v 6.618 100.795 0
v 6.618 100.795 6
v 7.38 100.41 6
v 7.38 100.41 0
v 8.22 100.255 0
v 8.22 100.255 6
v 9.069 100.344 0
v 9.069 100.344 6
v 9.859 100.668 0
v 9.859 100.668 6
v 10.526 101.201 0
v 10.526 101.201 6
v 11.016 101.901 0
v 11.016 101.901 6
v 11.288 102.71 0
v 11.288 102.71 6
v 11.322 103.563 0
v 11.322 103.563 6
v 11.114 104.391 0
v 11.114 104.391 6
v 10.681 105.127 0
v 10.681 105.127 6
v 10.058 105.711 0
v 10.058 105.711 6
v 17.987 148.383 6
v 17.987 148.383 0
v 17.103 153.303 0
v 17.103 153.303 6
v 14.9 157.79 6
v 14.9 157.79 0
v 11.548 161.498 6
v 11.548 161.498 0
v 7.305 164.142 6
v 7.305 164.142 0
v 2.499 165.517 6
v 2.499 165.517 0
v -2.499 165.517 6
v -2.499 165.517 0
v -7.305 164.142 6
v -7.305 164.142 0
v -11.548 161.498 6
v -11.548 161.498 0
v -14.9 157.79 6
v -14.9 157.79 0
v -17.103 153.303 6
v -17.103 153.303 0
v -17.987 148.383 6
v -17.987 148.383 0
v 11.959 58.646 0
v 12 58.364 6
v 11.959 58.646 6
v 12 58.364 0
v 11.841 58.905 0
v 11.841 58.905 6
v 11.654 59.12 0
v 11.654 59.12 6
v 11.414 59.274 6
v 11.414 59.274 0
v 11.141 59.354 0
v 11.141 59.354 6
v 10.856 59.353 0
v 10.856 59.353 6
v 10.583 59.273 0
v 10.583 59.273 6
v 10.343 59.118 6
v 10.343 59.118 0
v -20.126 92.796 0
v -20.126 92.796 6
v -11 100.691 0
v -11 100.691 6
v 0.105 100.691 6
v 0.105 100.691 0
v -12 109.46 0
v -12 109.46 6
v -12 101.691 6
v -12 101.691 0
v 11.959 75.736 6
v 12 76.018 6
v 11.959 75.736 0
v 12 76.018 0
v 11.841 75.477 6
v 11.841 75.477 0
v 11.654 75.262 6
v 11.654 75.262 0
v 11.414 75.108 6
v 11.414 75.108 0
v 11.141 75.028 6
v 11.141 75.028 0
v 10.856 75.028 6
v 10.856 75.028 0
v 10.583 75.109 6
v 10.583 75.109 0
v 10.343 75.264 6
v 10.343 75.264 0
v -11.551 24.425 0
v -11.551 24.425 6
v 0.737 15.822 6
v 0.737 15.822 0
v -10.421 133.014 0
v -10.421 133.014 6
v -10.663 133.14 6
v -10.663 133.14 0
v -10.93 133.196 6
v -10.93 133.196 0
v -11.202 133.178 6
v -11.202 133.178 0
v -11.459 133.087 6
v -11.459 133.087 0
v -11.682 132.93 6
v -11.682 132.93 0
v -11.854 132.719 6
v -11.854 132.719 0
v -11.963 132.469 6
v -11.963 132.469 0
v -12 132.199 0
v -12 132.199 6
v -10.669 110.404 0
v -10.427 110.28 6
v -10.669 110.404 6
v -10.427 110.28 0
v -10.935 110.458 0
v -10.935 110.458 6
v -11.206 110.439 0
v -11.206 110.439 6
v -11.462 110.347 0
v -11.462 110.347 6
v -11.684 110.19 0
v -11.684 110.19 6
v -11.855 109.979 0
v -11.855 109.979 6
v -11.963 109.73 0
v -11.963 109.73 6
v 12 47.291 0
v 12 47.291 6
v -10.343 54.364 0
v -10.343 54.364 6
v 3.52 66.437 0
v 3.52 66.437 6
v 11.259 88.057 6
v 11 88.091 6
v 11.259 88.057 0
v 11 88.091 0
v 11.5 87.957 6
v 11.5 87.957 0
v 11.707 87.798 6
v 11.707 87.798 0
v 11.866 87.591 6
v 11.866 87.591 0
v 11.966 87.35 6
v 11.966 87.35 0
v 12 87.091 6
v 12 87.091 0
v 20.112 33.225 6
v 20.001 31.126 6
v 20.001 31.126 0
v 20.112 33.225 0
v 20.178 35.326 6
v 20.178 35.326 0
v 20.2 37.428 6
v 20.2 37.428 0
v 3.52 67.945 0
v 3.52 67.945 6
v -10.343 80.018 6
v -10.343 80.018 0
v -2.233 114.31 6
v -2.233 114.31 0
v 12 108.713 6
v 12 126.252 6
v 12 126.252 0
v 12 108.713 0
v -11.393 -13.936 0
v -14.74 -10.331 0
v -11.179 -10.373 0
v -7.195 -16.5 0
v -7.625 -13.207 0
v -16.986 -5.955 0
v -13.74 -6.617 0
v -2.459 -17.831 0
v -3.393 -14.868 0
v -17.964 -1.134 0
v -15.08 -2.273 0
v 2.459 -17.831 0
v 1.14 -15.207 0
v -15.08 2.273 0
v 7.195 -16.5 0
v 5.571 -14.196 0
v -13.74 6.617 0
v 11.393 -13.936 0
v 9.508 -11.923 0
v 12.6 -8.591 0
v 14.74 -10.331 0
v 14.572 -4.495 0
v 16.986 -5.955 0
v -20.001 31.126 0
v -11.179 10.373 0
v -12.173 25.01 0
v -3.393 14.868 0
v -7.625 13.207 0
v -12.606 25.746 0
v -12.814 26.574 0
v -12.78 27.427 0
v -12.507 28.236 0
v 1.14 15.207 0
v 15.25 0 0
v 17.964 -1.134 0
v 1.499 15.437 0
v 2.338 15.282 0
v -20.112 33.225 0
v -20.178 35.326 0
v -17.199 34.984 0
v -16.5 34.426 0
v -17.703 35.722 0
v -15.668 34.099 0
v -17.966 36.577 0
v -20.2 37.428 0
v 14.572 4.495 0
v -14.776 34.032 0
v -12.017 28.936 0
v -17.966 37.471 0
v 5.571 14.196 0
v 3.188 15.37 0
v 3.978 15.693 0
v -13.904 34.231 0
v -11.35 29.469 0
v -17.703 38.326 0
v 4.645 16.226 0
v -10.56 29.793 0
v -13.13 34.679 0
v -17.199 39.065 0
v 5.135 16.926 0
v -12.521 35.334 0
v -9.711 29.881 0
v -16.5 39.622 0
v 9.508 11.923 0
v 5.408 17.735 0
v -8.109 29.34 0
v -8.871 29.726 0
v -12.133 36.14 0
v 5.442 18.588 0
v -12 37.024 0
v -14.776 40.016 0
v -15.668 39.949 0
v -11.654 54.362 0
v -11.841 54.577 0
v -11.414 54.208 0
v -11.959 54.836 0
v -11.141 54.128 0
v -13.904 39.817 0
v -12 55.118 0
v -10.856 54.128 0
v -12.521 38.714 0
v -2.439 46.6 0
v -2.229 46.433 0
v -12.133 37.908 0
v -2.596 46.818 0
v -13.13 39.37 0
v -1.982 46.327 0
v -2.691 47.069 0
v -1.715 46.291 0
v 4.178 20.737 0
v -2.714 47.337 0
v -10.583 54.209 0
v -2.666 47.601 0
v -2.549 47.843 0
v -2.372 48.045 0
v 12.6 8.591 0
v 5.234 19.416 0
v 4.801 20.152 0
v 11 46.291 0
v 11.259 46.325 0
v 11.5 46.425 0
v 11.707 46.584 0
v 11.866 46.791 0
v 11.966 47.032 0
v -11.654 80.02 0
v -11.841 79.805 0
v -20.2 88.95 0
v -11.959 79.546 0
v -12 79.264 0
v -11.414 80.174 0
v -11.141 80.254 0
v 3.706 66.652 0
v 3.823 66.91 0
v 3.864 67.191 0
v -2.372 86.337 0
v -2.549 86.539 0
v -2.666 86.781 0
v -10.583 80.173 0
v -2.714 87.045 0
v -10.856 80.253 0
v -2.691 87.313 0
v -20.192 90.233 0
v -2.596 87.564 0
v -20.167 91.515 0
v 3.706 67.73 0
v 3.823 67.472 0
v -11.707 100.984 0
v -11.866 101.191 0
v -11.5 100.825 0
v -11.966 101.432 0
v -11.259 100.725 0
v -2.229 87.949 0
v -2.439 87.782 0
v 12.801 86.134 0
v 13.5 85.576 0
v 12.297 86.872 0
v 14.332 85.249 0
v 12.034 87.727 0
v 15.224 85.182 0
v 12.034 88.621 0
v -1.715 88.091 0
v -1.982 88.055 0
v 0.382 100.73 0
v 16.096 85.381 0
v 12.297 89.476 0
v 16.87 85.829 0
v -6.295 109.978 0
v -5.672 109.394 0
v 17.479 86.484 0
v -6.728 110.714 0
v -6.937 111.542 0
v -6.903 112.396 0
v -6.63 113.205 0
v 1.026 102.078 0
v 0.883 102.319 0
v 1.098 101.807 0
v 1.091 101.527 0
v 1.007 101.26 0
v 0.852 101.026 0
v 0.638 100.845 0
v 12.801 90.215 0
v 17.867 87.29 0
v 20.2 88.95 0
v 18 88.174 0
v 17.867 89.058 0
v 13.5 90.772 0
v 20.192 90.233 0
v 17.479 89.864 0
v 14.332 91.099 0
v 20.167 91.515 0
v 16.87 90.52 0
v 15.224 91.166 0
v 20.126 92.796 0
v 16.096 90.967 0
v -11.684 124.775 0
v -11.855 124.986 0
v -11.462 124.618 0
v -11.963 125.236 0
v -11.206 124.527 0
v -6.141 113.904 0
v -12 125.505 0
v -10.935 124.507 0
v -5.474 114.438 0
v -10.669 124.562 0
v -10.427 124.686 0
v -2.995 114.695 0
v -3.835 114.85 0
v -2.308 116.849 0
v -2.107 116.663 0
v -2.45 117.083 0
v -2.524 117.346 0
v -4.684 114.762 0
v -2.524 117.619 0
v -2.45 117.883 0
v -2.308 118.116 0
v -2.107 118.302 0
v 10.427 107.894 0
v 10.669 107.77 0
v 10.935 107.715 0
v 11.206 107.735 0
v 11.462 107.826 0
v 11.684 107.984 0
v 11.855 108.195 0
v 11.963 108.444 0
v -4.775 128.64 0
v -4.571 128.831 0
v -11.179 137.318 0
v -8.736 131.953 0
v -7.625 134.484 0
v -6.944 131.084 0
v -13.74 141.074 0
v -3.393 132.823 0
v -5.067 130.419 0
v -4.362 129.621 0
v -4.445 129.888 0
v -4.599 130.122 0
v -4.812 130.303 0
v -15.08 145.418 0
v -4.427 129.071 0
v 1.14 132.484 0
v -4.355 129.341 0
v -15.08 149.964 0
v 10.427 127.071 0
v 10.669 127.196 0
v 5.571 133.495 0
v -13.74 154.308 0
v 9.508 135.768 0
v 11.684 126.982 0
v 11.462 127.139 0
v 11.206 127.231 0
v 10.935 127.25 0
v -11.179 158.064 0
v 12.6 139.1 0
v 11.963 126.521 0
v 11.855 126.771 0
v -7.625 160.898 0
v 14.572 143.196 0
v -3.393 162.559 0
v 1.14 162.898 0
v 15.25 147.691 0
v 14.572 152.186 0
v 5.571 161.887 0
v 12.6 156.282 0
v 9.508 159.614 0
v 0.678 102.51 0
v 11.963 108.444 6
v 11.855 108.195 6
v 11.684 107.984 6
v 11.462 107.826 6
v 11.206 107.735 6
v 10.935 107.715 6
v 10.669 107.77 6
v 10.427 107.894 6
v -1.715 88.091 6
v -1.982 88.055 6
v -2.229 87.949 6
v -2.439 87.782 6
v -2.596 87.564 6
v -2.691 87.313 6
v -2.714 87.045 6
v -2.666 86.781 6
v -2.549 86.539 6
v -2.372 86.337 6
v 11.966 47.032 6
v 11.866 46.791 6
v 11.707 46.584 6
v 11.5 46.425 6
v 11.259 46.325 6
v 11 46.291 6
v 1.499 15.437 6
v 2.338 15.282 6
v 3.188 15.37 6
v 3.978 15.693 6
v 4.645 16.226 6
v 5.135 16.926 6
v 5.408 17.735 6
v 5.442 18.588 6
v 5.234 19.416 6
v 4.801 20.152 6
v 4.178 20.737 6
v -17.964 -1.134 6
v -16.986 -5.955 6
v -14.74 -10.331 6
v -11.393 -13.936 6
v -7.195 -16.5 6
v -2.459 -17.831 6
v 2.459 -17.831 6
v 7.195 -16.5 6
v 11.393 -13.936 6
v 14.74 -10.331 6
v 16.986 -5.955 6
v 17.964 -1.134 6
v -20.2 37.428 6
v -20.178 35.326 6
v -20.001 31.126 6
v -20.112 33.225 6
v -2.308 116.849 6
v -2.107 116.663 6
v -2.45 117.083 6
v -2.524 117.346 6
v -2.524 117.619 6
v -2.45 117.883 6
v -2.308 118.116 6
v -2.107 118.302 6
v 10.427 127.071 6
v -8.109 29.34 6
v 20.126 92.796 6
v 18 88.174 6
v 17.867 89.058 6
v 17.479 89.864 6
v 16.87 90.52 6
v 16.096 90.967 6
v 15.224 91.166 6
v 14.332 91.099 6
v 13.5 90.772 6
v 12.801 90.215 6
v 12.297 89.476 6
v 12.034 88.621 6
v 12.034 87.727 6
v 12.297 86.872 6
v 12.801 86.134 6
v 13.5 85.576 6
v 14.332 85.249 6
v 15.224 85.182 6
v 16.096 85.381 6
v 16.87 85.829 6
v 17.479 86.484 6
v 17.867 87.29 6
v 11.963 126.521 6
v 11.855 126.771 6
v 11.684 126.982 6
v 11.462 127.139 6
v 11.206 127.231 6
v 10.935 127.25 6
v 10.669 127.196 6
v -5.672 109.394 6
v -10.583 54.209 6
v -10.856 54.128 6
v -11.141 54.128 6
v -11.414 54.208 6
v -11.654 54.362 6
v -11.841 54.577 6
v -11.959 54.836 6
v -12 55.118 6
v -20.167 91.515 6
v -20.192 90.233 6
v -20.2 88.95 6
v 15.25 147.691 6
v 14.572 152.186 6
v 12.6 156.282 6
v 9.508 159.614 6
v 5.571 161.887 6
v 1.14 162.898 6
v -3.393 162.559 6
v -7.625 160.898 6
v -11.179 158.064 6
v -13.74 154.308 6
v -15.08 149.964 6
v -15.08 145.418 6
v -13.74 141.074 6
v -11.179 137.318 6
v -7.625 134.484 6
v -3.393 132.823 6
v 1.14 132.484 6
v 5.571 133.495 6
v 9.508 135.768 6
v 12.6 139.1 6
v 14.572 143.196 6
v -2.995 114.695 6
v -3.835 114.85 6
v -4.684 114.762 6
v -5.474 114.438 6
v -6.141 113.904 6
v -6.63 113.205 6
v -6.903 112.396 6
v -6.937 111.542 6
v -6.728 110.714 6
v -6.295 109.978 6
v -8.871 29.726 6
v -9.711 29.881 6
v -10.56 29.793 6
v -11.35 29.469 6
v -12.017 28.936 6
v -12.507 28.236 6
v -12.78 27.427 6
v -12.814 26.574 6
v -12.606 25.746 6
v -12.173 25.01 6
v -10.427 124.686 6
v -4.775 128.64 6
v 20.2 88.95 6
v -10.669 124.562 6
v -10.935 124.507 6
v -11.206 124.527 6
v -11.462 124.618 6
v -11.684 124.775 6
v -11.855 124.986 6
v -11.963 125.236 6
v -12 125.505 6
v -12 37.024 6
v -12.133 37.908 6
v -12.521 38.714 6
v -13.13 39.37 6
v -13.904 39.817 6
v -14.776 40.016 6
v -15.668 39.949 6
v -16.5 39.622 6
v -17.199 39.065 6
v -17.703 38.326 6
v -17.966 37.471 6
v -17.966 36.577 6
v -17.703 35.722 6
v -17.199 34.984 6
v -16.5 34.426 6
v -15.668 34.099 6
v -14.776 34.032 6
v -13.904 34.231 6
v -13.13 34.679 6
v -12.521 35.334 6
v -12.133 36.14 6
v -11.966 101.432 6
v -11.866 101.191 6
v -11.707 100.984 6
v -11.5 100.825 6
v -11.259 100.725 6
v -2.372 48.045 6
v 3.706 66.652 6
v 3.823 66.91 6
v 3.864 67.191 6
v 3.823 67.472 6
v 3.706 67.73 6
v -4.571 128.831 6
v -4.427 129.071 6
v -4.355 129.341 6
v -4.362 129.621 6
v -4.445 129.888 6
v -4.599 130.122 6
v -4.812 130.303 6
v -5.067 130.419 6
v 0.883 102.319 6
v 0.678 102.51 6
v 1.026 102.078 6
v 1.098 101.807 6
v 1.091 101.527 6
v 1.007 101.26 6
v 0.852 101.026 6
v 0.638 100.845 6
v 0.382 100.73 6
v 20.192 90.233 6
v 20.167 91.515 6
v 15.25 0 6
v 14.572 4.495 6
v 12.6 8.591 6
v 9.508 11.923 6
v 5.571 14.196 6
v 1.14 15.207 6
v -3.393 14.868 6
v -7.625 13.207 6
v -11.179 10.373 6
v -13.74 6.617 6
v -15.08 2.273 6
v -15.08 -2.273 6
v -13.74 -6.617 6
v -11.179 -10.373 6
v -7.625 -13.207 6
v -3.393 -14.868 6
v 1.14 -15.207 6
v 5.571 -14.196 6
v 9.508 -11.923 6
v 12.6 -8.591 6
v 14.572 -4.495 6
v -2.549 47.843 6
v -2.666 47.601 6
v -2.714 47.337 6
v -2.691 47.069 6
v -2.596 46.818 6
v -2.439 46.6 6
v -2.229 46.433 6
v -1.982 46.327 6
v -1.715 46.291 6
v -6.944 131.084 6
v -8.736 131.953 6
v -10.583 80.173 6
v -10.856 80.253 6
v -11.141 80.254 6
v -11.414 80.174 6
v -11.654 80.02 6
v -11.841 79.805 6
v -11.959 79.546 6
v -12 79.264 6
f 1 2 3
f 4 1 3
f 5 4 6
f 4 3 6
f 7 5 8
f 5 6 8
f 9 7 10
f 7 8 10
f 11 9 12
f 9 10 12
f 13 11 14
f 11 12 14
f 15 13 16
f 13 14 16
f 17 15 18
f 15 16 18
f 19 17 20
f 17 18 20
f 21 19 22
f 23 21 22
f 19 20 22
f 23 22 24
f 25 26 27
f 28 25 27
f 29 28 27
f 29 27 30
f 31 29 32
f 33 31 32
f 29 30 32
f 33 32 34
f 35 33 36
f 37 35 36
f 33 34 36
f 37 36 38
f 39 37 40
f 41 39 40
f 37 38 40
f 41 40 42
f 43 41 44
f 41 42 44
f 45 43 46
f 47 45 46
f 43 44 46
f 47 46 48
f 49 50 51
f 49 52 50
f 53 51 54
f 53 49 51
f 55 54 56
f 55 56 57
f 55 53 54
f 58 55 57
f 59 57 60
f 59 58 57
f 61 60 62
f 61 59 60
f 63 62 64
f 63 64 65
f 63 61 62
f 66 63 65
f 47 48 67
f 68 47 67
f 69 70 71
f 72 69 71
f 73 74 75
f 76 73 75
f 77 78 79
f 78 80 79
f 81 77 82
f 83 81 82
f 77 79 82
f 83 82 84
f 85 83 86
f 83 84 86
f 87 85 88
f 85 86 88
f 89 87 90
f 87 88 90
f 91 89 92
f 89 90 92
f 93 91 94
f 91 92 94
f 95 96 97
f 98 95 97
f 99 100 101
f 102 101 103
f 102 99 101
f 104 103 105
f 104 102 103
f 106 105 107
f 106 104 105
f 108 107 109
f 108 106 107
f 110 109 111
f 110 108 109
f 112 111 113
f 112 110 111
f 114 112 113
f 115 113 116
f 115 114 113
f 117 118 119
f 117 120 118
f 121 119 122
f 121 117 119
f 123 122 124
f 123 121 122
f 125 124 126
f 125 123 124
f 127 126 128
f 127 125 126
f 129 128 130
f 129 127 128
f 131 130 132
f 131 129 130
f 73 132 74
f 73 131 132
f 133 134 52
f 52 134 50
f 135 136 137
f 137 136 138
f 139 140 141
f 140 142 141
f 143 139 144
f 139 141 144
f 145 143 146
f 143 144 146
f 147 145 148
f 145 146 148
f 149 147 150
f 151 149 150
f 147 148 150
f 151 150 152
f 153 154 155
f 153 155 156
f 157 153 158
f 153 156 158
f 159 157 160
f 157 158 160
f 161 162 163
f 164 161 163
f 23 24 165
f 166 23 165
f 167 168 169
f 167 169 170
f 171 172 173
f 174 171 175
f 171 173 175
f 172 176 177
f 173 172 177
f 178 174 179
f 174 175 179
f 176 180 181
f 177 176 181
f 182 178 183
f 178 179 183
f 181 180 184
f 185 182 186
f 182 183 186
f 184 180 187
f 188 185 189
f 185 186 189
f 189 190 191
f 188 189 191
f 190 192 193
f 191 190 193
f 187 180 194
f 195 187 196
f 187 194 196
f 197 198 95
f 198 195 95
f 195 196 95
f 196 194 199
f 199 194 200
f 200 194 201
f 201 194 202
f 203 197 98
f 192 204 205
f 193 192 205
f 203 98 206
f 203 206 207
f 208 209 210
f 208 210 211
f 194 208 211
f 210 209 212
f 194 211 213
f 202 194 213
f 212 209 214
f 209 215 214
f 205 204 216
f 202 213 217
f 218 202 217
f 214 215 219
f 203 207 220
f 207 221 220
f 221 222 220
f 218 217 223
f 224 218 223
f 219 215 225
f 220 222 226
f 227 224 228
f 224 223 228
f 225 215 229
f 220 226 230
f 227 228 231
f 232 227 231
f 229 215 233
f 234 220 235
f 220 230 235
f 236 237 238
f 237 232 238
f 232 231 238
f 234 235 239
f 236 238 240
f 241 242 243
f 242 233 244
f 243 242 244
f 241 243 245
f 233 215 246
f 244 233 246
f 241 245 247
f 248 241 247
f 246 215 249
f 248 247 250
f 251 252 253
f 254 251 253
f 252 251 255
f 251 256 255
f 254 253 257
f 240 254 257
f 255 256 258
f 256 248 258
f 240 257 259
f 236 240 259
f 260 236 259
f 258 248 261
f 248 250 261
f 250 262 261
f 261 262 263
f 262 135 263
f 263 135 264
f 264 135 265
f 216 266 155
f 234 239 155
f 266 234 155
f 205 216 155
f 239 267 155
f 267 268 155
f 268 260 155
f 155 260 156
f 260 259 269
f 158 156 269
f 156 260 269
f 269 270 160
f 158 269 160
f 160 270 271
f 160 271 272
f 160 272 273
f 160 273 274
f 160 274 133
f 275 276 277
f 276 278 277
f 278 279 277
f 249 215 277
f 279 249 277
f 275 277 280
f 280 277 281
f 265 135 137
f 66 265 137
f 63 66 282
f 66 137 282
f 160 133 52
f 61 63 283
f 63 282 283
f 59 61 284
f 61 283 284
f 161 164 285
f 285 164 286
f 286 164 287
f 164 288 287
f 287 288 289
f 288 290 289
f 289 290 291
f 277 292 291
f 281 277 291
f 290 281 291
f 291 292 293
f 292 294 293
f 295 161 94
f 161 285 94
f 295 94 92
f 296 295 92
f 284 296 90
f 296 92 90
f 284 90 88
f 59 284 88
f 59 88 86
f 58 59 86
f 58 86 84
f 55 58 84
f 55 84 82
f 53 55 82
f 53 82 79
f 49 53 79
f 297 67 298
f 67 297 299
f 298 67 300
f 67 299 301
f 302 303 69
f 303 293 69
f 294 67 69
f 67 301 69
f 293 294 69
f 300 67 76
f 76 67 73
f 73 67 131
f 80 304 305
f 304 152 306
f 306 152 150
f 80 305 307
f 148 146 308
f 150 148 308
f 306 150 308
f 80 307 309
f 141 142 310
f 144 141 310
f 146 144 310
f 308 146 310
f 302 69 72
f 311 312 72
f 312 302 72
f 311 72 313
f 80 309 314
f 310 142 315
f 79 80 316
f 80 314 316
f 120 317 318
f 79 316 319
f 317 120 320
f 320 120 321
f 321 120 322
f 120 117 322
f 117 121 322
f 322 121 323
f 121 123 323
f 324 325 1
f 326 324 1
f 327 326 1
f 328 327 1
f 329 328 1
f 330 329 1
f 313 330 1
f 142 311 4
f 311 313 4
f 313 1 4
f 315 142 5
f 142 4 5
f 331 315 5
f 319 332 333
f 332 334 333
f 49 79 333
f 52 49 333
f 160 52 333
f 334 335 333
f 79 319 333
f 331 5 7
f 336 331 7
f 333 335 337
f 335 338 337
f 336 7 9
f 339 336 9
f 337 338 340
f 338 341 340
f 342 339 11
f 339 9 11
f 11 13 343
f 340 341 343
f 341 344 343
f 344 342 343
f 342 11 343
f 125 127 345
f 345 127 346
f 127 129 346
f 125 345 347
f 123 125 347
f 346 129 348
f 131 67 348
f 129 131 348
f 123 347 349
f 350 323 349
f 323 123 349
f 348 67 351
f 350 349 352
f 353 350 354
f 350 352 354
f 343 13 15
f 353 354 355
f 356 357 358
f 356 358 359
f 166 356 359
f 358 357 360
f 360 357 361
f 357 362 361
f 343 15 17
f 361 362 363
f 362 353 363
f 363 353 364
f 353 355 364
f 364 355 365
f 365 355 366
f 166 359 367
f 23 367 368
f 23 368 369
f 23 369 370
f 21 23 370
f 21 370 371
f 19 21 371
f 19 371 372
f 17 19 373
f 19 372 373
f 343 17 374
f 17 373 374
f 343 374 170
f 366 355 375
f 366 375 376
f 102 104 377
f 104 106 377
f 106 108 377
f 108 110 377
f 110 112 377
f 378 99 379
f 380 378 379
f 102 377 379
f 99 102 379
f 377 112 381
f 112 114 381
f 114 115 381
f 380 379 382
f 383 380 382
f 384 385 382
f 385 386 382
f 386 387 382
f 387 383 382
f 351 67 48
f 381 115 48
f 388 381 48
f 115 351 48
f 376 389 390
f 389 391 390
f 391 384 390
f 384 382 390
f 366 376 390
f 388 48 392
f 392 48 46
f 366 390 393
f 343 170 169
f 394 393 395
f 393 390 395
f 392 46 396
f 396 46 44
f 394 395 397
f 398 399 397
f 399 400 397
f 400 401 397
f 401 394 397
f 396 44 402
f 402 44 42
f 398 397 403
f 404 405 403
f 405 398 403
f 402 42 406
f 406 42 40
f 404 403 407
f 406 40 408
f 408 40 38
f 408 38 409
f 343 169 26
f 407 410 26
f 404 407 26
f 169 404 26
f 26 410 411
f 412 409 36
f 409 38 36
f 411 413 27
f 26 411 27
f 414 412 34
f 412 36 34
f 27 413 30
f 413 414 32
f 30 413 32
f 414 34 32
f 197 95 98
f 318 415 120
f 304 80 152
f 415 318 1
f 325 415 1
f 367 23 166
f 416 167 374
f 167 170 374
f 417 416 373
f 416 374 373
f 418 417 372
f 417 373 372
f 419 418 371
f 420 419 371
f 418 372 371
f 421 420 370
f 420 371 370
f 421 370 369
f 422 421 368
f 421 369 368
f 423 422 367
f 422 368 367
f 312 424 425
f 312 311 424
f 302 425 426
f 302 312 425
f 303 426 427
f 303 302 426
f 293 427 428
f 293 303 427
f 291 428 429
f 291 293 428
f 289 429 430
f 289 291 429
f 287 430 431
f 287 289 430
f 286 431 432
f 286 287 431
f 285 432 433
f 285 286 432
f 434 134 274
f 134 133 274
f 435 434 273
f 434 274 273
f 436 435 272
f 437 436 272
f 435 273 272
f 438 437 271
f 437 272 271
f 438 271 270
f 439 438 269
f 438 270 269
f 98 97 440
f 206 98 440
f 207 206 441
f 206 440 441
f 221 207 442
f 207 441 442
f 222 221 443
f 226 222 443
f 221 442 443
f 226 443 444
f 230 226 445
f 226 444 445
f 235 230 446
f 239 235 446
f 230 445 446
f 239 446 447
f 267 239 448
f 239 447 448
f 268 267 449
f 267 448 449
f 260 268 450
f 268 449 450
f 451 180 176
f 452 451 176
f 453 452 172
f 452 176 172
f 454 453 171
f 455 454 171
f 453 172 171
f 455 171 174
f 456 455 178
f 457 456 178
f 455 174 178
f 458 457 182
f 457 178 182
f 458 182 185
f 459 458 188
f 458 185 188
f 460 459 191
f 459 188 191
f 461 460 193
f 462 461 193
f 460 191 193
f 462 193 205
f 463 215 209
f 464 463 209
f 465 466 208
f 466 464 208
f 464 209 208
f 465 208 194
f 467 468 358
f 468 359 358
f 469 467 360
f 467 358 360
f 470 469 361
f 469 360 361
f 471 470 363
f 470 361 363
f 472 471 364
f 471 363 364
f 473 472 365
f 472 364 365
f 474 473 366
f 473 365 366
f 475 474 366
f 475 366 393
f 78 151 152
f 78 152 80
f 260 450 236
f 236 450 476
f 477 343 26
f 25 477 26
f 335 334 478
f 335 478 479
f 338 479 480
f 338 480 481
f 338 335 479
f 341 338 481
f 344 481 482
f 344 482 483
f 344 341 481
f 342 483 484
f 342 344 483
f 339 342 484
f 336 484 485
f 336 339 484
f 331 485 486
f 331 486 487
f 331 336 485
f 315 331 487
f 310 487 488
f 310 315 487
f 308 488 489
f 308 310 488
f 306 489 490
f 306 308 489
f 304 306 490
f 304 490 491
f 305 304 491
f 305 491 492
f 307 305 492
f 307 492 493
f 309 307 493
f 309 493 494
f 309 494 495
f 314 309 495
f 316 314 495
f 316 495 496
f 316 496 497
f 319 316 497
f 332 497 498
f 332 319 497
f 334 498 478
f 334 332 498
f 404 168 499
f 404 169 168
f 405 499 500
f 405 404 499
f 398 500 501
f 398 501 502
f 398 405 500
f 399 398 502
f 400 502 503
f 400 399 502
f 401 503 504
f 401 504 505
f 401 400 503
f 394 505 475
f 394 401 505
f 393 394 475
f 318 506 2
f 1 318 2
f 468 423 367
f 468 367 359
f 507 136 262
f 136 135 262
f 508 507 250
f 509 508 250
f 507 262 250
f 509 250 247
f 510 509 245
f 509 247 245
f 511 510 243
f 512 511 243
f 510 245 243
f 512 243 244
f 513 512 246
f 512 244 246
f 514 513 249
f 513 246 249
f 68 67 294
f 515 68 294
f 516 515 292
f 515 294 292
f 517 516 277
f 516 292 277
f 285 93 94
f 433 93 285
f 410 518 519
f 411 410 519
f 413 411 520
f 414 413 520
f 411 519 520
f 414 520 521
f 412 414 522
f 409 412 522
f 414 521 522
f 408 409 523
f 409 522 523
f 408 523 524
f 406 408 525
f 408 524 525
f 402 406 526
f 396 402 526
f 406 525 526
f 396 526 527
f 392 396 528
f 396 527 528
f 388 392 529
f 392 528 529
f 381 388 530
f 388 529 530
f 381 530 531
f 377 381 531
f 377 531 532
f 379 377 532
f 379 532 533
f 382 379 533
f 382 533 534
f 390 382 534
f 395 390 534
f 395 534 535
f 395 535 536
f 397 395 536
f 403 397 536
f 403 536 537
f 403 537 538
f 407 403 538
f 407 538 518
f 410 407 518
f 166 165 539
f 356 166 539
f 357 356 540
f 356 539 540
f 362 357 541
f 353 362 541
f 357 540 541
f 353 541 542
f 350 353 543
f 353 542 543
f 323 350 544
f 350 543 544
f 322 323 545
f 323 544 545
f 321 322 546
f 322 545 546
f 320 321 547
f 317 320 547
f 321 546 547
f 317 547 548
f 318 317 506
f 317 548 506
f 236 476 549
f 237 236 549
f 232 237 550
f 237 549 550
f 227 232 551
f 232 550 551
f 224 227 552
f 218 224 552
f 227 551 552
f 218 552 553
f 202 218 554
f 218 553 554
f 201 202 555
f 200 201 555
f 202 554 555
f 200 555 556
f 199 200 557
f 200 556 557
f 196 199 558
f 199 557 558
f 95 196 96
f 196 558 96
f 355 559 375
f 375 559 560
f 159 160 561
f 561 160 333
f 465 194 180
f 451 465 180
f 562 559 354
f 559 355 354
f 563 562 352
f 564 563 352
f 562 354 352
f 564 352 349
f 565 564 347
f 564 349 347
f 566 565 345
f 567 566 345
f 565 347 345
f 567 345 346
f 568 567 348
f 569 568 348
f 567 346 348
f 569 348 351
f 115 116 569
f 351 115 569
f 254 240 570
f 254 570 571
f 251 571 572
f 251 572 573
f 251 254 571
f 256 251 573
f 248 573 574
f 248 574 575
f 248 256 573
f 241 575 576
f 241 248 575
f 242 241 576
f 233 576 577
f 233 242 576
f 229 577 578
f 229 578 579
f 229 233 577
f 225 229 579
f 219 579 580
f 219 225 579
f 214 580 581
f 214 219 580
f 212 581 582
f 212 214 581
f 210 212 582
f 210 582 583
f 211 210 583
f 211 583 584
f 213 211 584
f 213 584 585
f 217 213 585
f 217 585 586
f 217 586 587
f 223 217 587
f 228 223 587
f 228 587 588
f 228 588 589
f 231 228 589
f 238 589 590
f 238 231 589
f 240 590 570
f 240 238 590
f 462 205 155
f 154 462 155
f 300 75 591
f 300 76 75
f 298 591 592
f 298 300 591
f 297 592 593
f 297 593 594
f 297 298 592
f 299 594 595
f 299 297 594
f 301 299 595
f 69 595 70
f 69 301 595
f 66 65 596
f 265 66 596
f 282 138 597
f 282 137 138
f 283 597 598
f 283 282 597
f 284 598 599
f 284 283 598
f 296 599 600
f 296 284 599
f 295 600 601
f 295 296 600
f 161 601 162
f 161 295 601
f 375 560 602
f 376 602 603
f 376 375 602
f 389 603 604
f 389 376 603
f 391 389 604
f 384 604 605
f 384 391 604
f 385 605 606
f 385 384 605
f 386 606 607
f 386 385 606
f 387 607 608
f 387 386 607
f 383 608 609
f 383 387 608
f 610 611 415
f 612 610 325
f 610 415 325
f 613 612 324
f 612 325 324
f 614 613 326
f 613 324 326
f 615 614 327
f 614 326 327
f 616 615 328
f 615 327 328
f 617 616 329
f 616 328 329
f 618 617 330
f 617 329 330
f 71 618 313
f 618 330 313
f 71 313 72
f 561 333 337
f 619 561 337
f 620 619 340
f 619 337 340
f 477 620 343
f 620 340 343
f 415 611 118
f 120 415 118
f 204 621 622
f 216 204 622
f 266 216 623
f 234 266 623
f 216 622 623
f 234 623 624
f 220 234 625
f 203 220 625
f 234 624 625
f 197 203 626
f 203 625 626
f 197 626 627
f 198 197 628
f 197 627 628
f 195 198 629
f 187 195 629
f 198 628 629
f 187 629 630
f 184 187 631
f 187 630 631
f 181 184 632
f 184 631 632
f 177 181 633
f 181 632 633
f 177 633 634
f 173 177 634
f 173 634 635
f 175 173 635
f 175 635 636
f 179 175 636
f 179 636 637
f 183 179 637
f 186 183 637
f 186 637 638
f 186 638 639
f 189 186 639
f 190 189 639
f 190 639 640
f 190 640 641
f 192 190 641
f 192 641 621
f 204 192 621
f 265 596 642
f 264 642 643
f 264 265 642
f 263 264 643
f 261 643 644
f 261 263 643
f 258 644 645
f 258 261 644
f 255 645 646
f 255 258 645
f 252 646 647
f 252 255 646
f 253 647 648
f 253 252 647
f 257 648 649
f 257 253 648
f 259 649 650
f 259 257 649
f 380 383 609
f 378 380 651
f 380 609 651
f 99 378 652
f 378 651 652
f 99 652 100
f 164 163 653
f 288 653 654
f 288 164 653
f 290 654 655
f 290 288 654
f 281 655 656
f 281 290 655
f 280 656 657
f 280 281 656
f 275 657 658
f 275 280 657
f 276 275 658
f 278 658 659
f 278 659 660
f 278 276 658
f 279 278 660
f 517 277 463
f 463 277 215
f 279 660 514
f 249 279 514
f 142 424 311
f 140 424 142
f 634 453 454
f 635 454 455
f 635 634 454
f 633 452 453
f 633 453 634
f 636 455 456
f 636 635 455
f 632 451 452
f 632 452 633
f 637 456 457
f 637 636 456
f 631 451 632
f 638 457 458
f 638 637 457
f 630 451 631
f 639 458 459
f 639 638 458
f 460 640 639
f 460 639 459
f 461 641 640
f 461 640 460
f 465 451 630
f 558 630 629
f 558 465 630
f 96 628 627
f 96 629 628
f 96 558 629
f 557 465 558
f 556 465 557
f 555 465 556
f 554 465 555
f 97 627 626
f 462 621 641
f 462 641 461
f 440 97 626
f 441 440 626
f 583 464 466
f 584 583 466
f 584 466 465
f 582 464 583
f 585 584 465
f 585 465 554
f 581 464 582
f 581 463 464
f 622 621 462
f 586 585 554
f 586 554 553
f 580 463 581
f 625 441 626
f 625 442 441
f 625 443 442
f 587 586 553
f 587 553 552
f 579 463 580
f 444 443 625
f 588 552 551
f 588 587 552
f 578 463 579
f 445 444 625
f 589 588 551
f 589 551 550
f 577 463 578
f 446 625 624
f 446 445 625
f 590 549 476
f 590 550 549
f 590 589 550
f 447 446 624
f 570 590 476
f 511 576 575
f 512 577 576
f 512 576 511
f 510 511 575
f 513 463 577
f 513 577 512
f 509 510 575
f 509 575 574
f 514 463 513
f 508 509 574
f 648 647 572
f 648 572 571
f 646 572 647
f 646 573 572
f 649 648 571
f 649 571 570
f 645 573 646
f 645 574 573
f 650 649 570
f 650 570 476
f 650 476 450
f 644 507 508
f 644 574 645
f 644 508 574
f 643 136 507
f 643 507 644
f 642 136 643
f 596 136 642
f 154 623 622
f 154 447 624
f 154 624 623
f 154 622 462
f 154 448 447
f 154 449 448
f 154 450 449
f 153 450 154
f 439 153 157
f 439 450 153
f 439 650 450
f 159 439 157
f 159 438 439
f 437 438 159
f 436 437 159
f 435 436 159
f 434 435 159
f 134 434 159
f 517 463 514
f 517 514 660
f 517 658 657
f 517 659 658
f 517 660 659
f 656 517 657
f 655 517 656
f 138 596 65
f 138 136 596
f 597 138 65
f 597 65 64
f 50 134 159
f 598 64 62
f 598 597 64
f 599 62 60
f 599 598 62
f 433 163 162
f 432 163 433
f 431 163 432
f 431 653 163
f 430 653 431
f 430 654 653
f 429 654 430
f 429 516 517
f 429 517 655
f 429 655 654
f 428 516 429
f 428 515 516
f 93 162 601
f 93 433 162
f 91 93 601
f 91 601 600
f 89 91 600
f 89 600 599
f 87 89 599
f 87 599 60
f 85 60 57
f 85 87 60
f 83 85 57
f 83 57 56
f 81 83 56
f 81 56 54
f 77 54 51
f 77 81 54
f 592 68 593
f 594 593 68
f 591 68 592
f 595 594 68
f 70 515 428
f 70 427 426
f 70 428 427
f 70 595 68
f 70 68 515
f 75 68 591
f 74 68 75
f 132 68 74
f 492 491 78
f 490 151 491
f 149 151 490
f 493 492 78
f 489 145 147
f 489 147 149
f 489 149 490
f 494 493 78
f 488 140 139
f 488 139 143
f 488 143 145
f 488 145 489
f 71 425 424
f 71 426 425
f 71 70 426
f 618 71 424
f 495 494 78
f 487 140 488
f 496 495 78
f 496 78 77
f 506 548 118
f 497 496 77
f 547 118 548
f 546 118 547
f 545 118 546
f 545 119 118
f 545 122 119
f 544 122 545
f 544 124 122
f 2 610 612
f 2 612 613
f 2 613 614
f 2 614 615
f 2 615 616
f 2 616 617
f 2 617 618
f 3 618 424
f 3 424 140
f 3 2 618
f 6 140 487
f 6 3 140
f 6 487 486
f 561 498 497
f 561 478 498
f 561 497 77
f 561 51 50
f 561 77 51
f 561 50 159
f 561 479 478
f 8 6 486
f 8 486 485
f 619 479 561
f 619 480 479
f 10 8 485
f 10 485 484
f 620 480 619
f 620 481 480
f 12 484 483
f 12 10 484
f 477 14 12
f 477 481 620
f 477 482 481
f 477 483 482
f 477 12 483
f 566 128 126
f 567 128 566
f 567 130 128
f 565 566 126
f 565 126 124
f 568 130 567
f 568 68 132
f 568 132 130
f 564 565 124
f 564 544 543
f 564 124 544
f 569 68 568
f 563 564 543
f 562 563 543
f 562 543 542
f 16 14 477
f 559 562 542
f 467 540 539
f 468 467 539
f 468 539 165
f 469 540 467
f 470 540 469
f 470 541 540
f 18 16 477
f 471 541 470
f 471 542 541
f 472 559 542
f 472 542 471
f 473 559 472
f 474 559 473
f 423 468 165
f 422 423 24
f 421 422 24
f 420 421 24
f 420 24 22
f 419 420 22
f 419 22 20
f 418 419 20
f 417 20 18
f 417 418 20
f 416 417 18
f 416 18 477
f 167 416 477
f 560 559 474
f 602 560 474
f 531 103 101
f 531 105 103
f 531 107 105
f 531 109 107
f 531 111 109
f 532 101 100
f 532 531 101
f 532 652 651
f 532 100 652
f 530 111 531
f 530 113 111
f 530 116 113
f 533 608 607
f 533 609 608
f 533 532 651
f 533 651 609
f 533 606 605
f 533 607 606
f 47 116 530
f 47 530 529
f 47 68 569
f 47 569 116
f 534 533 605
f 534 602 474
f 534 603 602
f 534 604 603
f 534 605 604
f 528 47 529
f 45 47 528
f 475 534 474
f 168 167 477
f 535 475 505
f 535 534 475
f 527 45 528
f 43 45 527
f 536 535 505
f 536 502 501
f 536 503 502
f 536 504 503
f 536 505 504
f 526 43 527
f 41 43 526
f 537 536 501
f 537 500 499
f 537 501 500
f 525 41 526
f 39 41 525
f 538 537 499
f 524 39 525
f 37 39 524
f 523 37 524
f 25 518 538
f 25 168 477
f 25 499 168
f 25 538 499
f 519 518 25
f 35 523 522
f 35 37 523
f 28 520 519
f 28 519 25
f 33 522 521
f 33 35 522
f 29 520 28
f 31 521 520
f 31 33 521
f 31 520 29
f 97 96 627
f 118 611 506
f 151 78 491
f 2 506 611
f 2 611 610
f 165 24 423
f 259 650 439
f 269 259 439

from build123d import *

# Parameters (mm, degrees)
SKETCH1_R               = 7.95
SKETCH1_R_2             = 3
MAIN_BODY_LINK_B1_DEPTH = 6
CUT_EXTRUDE2_REACH      = 169.025
CUT_EXTRUDE3_REACH      = 169.025
SKETCH5_R               = 1.5
PULLEYIDLERUP_DEPTH     = 6
CUT_EXTRUDE5_DEPTH      = 6
FILLET4_R               = 1
FILLET5_R               = 100
SKETCH8_R               = 15.25
CUT_EXTRUDE6_DEPTH      = 168.02546447


with BuildPart() as part:
    # Sketch1 → Main Body Link B1 (new body)
    with BuildSketch(Plane.XY):
        with BuildLine():
            Line((20.2, 41.674052381), (20.2, 83.474052381))
            Line((20.2, 83.474052381), (20.2, 90.874052381))
            Line((20.2, 90.874052381), (17.986683974, 148.383116621))
            ThreePointArc((17.986683974, 148.383116621), (0, 165.690874165), (-17.986683974, 148.383116621))
            Line((-17.986683974, 148.383116621), (-20.2, 90.874052381))
            Line((-20.2, 90.874052381), (-20.2, 83.474052381))
            Line((-20.2, 83.474052381), (-20.2, 41.674052381))
            Line((-20.2, 41.674052381), (-20.2, 34.274052381))
            Line((-20.2, 34.274052381), (-17.964224051, -1.134307826))
            ThreePointArc((-17.964224051, -1.134307826), (0, -18), (17.964224051, -1.134307826))
            Line((17.964224051, -1.134307826), (20.2, 34.274052381))
            Line((20.2, 34.274052381), (20.2, 41.674052381))
        make_face()
        Circle(SKETCH1_R, mode=Mode.SUBTRACT)
        with Locations((15, 88.174052381)):
            Circle(SKETCH1_R_2, mode=Mode.SUBTRACT)
        with Locations((-15, 37.024052381)):
            Circle(SKETCH1_R_2, mode=Mode.SUBTRACT)
        with Locations((0, 147.690874165)):
            Circle(SKETCH1_R, mode=Mode.SUBTRACT)
    extrude(amount=MAIN_BODY_LINK_B1_DEPTH)

    # Sketch4 → Cut-Extrude2 (cut, up to next)
    with BuildSketch(Plane.XY.offset(6), mode=Mode.PRIVATE) as cut_extrude2_sk1:
        with BuildLine():
            Line((-12, 134.2744663), (-12, 123.584968066))
            Line((-12, 123.584968066), (-2.929911079, 129.930929878))
            ThreePointArc((-2.929911079, 129.930929878), (-7.774454217, 131.456408925), (-12, 134.2744663))
        make_face()
    cut_extrude2_tool1 = extrude(cut_extrude2_sk1.sketch, amount=-CUT_EXTRUDE2_REACH, mode=Mode.PRIVATE) & part.part
    # Sketch4 → Cut-Extrude2 (cut, up to next)
    with BuildSketch(Plane.XY.offset(6), mode=Mode.PRIVATE) as cut_extrude2_sk2:
        Polygon((-12, 100.690874165), (3.278172542, 100.690874165), (-12, 111.380372399), align=None)
    cut_extrude2_tool2 = extrude(cut_extrude2_sk2.sketch, amount=-CUT_EXTRUDE2_REACH, mode=Mode.PRIVATE) & part.part
    # Sketch4 → Cut-Extrude2 (cut, up to next)
    with BuildSketch(Plane.XY.offset(6), mode=Mode.PRIVATE) as cut_extrude2_sk3:
        Polygon((12, 128.172168466), (12, 106.793171999), (-3.278172542, 117.482670232), align=None)
    cut_extrude2_tool3 = extrude(cut_extrude2_sk3.sketch, amount=-CUT_EXTRUDE2_REACH, mode=Mode.PRIVATE) & part.part
    # Sketch4 → Cut-Extrude2 (cut, up to next)
    with BuildSketch(Plane.XY.offset(6), mode=Mode.PRIVATE) as cut_extrude2_sk4:
        Polygon((-4.386441158, 88.090874165), (12, 88.090874165), (12, 73.82101499), align=None)
    cut_extrude2_tool4 = extrude(cut_extrude2_sk4.sketch, amount=-CUT_EXTRUDE2_REACH, mode=Mode.PRIVATE) & part.part
    # Sketch4 → Cut-Extrude2 (cut, up to next)
    with BuildSketch(Plane.XY.offset(6), mode=Mode.PRIVATE) as cut_extrude2_sk5:
        Polygon((-12, 81.46073334), (-12, 52.92101499), (4.386441158, 67.190874165), align=None)
    cut_extrude2_tool5 = extrude(cut_extrude2_sk5.sketch, amount=-CUT_EXTRUDE2_REACH, mode=Mode.PRIVATE) & part.part
    # Sketch4 → Cut-Extrude2 (cut, up to next)
    with BuildSketch(Plane.XY.offset(6), mode=Mode.PRIVATE) as cut_extrude2_sk6:
        Polygon((-4.386441158, 46.290874165), (12, 46.290874165), (12, 60.56073334), align=None)
    cut_extrude2_tool6 = extrude(cut_extrude2_sk6.sketch, amount=-CUT_EXTRUDE2_REACH, mode=Mode.PRIVATE) & part.part
    add(cut_extrude2_tool1.solids().sort_by_distance((-9.12997, 128.978342, 6))[0], mode=Mode.SUBTRACT)
    add(cut_extrude2_tool2.solids().sort_by_distance((-6.907276, 104.25404, 6))[0], mode=Mode.SUBTRACT)
    add(cut_extrude2_tool3.solids().sort_by_distance((6.907276, 117.48267, 6))[0], mode=Mode.SUBTRACT)
    add(cut_extrude2_tool4.solids().sort_by_distance((6.537853, 83.334254, 6))[0], mode=Mode.SUBTRACT)
    add(cut_extrude2_tool5.solids().sort_by_distance((-6.537853, 67.190874, 6))[0], mode=Mode.SUBTRACT)
    add(cut_extrude2_tool6.solids().sort_by_distance((6.537853, 51.047494, 6))[0], mode=Mode.SUBTRACT)

    # Sketch5 → Cut-Extrude3 (cut, up to next)
    with BuildSketch(Plane.XY.offset(6), mode=Mode.PRIVATE) as cut_extrude3_sk1:
        with Locations((11.5, 147.690874165)):
            Circle(SKETCH5_R)
    cut_extrude3_tool1 = extrude(cut_extrude3_sk1.sketch, amount=-CUT_EXTRUDE3_REACH, mode=Mode.PRIVATE) & part.part
    # Sketch5 → Cut-Extrude3 (cut, up to next)
    with BuildSketch(Plane.XY.offset(6), mode=Mode.PRIVATE) as cut_extrude3_sk2:
        with Locations((-11.5, 147.690874165)):
            Circle(SKETCH5_R)
    cut_extrude3_tool2 = extrude(cut_extrude3_sk2.sketch, amount=-CUT_EXTRUDE3_REACH, mode=Mode.PRIVATE) & part.part
    # Sketch5 → Cut-Extrude3 (cut, up to next)
    with BuildSketch(Plane.XY.offset(6), mode=Mode.PRIVATE) as cut_extrude3_sk3:
        with Locations((-11.5, 0)):
            Circle(SKETCH5_R)
    cut_extrude3_tool3 = extrude(cut_extrude3_sk3.sketch, amount=-CUT_EXTRUDE3_REACH, mode=Mode.PRIVATE) & part.part
    # Sketch5 → Cut-Extrude3 (cut, up to next)
    with BuildSketch(Plane.XY.offset(6), mode=Mode.PRIVATE) as cut_extrude3_sk4:
        with Locations((11.5, 0)):
            Circle(SKETCH5_R)
    cut_extrude3_tool4 = extrude(cut_extrude3_sk4.sketch, amount=-CUT_EXTRUDE3_REACH, mode=Mode.PRIVATE) & part.part
    add(cut_extrude3_tool1.solids().sort_by_distance((11.5, 147.690874, 6))[0], mode=Mode.SUBTRACT)
    add(cut_extrude3_tool2.solids().sort_by_distance((-11.5, 147.690874, 6))[0], mode=Mode.SUBTRACT)
    add(cut_extrude3_tool3.solids().sort_by_distance((-11.5, 0, 6))[0], mode=Mode.SUBTRACT)
    add(cut_extrude3_tool4.solids().sort_by_distance((11.5, 0, 6))[0], mode=Mode.SUBTRACT)

    # Sketch6 → PulleyIdlerUp (cut)
    with BuildSketch(Plane.XY.offset(6)):
        with BuildLine():
            Line((-5.672455467, 109.394173307), (6.61799676, 100.795058))
            ThreePointArc((6.61799676, 100.795058), (10.795910267, 101.533325384), (10.057642883, 105.71123889))
            Line((10.057642883, 105.71123889), (-2.232809344, 114.310354197))
            ThreePointArc((-2.232809344, 114.310354197), (-6.410722851, 113.572086814), (-5.672455467, 109.394173307))
        make_face()
    extrude(amount=-PULLEYIDLERUP_DEPTH, mode=Mode.SUBTRACT)

    # Sketch7 → Cut-Extrude5 (cut)
    with BuildSketch(Plane.XY.offset(6)):
        with BuildLine():
            Line((-11.550553841, 24.425461103), (0.736726824, 15.821814558))
            ThreePointArc((0.736726824, 15.821814558), (4.914912266, 16.558541382), (4.178185442, 20.736726824))
            Line((4.178185442, 20.736726824), (-8.109095222, 29.340373369))
            ThreePointArc((-8.109095222, 29.340373369), (-12.287280664, 28.603646545), (-11.550553841, 24.425461103))
        make_face()
    extrude(amount=-CUT_EXTRUDE5_DEPTH, mode=Mode.SUBTRACT)

    # Fillet4
    fillet4_edges = [part.edges().sort_by_distance(p)[0] for p in [
        (-12, 81.46073334, 3),
        (4.386441158, 67.190874165, 3),
        (-12, 52.92101499, 3),
        (-12, 134.2744663, 3),
        (-2.929911079, 129.930929878, 3),
        (-12, 123.584968066, 3),
        (-12, 100.690874165, 3),
        (-12, 111.380372399, 3),
        (3.278172542, 100.690874165, 3),
        (12, 106.793171999, 3),
        (-3.278172542, 117.482670232, 3),
        (12, 128.172168466, 3),
        (12, 60.56073334, 3),
        (12, 46.290874165, 3),
        (-4.386441158, 46.290874165, 3),
        (12, 88.090874165, 3),
        (12, 73.82101499, 3),
        (-4.386441158, 88.090874165, 3),
    ]]
    fillet(fillet4_edges, radius=FILLET4_R)

    # Fillet5
    # the kernel refuses this fillet: 100 mm, written as the material it takes off along each edge
    with BuildSketch(Plane(origin=(-20.2, 34.274052381, -7.884973578), x_dir=(0, 1, 0), z_dir=(0, 0, 1))) as fillet5_piece_1:
        with BuildLine():
            CenterArc((FILLET5_R * 0.0315398943126, -FILLET5_R), FILLET5_R, 90, 3.613007947)
            Line((-FILLET5_R * 0.0314772071099, -FILLET5_R * 0.00198755271875), (0, 0))
            Line((0, 0), (FILLET5_R * 0.0315398943126, 0))
        make_face()
    extrude(amount=21.769947156, mode=Mode.SUBTRACT)
    with BuildSketch(Plane(origin=(-20.2, 90.874052381, -4.809018086), x_dir=(0.03845791424359976, 0.9992602207793684, 0), z_dir=(0, 0, 1))) as fillet5_piece_2:
        with BuildLine():
            CenterArc((FILLET5_R * 0.0192360723451, -FILLET5_R), FILLET5_R, 90, 2.204019698)
            Line((-FILLET5_R * 0.0192218418985, -FILLET5_R * 0.000739779220632), (0, 0))
            Line((0, 0), (FILLET5_R * 0.0192360723451, 0))
        make_face()
    extrude(amount=15.618036173, mode=Mode.SUBTRACT)
    with BuildSketch(Plane(origin=(20.2, 90.874052381, -4.809018086), x_dir=(-0.03845791424359111, 0.9992602207793686, 0), z_dir=(0, 0, 1))) as fillet5_piece_3:
        with BuildLine():
            CenterArc((FILLET5_R * 0.0192360723451, FILLET5_R), FILLET5_R, 267.795980302, 2.204019698)
            Line((-FILLET5_R * 0.0192218418985, FILLET5_R * 0.000739779220631), (0, 0))
            Line((0, 0), (FILLET5_R * 0.0192360723451, 0))
        make_face()
    extrude(amount=15.618036173, mode=Mode.SUBTRACT)
    with BuildSketch(Plane(origin=(20.2, 34.274052381, -7.884973578), x_dir=(0, 1, 0), z_dir=(0, 0, 1))) as fillet5_piece_4:
        with BuildLine():
            CenterArc((FILLET5_R * 0.0315398943126, FILLET5_R), FILLET5_R, 266.386992053, 3.613007947)
            Line((-FILLET5_R * 0.0314772071099, FILLET5_R * 0.00198755271875), (0, 0))
            Line((0, 0), (FILLET5_R * 0.0315398943126, 0))
        make_face()
    extrude(amount=21.769947156, mode=Mode.SUBTRACT)

    # Sketch8 → Cut-Extrude6 (cut, through all)
    with BuildSketch(Plane.XY.offset(6)):
        Circle(SKETCH8_R)
        with Locations((0, 147.690874165)):
            Circle(SKETCH8_R)
    extrude(amount=-CUT_EXTRUDE6_DEPTH, mode=Mode.SUBTRACT)


solid = part.part
